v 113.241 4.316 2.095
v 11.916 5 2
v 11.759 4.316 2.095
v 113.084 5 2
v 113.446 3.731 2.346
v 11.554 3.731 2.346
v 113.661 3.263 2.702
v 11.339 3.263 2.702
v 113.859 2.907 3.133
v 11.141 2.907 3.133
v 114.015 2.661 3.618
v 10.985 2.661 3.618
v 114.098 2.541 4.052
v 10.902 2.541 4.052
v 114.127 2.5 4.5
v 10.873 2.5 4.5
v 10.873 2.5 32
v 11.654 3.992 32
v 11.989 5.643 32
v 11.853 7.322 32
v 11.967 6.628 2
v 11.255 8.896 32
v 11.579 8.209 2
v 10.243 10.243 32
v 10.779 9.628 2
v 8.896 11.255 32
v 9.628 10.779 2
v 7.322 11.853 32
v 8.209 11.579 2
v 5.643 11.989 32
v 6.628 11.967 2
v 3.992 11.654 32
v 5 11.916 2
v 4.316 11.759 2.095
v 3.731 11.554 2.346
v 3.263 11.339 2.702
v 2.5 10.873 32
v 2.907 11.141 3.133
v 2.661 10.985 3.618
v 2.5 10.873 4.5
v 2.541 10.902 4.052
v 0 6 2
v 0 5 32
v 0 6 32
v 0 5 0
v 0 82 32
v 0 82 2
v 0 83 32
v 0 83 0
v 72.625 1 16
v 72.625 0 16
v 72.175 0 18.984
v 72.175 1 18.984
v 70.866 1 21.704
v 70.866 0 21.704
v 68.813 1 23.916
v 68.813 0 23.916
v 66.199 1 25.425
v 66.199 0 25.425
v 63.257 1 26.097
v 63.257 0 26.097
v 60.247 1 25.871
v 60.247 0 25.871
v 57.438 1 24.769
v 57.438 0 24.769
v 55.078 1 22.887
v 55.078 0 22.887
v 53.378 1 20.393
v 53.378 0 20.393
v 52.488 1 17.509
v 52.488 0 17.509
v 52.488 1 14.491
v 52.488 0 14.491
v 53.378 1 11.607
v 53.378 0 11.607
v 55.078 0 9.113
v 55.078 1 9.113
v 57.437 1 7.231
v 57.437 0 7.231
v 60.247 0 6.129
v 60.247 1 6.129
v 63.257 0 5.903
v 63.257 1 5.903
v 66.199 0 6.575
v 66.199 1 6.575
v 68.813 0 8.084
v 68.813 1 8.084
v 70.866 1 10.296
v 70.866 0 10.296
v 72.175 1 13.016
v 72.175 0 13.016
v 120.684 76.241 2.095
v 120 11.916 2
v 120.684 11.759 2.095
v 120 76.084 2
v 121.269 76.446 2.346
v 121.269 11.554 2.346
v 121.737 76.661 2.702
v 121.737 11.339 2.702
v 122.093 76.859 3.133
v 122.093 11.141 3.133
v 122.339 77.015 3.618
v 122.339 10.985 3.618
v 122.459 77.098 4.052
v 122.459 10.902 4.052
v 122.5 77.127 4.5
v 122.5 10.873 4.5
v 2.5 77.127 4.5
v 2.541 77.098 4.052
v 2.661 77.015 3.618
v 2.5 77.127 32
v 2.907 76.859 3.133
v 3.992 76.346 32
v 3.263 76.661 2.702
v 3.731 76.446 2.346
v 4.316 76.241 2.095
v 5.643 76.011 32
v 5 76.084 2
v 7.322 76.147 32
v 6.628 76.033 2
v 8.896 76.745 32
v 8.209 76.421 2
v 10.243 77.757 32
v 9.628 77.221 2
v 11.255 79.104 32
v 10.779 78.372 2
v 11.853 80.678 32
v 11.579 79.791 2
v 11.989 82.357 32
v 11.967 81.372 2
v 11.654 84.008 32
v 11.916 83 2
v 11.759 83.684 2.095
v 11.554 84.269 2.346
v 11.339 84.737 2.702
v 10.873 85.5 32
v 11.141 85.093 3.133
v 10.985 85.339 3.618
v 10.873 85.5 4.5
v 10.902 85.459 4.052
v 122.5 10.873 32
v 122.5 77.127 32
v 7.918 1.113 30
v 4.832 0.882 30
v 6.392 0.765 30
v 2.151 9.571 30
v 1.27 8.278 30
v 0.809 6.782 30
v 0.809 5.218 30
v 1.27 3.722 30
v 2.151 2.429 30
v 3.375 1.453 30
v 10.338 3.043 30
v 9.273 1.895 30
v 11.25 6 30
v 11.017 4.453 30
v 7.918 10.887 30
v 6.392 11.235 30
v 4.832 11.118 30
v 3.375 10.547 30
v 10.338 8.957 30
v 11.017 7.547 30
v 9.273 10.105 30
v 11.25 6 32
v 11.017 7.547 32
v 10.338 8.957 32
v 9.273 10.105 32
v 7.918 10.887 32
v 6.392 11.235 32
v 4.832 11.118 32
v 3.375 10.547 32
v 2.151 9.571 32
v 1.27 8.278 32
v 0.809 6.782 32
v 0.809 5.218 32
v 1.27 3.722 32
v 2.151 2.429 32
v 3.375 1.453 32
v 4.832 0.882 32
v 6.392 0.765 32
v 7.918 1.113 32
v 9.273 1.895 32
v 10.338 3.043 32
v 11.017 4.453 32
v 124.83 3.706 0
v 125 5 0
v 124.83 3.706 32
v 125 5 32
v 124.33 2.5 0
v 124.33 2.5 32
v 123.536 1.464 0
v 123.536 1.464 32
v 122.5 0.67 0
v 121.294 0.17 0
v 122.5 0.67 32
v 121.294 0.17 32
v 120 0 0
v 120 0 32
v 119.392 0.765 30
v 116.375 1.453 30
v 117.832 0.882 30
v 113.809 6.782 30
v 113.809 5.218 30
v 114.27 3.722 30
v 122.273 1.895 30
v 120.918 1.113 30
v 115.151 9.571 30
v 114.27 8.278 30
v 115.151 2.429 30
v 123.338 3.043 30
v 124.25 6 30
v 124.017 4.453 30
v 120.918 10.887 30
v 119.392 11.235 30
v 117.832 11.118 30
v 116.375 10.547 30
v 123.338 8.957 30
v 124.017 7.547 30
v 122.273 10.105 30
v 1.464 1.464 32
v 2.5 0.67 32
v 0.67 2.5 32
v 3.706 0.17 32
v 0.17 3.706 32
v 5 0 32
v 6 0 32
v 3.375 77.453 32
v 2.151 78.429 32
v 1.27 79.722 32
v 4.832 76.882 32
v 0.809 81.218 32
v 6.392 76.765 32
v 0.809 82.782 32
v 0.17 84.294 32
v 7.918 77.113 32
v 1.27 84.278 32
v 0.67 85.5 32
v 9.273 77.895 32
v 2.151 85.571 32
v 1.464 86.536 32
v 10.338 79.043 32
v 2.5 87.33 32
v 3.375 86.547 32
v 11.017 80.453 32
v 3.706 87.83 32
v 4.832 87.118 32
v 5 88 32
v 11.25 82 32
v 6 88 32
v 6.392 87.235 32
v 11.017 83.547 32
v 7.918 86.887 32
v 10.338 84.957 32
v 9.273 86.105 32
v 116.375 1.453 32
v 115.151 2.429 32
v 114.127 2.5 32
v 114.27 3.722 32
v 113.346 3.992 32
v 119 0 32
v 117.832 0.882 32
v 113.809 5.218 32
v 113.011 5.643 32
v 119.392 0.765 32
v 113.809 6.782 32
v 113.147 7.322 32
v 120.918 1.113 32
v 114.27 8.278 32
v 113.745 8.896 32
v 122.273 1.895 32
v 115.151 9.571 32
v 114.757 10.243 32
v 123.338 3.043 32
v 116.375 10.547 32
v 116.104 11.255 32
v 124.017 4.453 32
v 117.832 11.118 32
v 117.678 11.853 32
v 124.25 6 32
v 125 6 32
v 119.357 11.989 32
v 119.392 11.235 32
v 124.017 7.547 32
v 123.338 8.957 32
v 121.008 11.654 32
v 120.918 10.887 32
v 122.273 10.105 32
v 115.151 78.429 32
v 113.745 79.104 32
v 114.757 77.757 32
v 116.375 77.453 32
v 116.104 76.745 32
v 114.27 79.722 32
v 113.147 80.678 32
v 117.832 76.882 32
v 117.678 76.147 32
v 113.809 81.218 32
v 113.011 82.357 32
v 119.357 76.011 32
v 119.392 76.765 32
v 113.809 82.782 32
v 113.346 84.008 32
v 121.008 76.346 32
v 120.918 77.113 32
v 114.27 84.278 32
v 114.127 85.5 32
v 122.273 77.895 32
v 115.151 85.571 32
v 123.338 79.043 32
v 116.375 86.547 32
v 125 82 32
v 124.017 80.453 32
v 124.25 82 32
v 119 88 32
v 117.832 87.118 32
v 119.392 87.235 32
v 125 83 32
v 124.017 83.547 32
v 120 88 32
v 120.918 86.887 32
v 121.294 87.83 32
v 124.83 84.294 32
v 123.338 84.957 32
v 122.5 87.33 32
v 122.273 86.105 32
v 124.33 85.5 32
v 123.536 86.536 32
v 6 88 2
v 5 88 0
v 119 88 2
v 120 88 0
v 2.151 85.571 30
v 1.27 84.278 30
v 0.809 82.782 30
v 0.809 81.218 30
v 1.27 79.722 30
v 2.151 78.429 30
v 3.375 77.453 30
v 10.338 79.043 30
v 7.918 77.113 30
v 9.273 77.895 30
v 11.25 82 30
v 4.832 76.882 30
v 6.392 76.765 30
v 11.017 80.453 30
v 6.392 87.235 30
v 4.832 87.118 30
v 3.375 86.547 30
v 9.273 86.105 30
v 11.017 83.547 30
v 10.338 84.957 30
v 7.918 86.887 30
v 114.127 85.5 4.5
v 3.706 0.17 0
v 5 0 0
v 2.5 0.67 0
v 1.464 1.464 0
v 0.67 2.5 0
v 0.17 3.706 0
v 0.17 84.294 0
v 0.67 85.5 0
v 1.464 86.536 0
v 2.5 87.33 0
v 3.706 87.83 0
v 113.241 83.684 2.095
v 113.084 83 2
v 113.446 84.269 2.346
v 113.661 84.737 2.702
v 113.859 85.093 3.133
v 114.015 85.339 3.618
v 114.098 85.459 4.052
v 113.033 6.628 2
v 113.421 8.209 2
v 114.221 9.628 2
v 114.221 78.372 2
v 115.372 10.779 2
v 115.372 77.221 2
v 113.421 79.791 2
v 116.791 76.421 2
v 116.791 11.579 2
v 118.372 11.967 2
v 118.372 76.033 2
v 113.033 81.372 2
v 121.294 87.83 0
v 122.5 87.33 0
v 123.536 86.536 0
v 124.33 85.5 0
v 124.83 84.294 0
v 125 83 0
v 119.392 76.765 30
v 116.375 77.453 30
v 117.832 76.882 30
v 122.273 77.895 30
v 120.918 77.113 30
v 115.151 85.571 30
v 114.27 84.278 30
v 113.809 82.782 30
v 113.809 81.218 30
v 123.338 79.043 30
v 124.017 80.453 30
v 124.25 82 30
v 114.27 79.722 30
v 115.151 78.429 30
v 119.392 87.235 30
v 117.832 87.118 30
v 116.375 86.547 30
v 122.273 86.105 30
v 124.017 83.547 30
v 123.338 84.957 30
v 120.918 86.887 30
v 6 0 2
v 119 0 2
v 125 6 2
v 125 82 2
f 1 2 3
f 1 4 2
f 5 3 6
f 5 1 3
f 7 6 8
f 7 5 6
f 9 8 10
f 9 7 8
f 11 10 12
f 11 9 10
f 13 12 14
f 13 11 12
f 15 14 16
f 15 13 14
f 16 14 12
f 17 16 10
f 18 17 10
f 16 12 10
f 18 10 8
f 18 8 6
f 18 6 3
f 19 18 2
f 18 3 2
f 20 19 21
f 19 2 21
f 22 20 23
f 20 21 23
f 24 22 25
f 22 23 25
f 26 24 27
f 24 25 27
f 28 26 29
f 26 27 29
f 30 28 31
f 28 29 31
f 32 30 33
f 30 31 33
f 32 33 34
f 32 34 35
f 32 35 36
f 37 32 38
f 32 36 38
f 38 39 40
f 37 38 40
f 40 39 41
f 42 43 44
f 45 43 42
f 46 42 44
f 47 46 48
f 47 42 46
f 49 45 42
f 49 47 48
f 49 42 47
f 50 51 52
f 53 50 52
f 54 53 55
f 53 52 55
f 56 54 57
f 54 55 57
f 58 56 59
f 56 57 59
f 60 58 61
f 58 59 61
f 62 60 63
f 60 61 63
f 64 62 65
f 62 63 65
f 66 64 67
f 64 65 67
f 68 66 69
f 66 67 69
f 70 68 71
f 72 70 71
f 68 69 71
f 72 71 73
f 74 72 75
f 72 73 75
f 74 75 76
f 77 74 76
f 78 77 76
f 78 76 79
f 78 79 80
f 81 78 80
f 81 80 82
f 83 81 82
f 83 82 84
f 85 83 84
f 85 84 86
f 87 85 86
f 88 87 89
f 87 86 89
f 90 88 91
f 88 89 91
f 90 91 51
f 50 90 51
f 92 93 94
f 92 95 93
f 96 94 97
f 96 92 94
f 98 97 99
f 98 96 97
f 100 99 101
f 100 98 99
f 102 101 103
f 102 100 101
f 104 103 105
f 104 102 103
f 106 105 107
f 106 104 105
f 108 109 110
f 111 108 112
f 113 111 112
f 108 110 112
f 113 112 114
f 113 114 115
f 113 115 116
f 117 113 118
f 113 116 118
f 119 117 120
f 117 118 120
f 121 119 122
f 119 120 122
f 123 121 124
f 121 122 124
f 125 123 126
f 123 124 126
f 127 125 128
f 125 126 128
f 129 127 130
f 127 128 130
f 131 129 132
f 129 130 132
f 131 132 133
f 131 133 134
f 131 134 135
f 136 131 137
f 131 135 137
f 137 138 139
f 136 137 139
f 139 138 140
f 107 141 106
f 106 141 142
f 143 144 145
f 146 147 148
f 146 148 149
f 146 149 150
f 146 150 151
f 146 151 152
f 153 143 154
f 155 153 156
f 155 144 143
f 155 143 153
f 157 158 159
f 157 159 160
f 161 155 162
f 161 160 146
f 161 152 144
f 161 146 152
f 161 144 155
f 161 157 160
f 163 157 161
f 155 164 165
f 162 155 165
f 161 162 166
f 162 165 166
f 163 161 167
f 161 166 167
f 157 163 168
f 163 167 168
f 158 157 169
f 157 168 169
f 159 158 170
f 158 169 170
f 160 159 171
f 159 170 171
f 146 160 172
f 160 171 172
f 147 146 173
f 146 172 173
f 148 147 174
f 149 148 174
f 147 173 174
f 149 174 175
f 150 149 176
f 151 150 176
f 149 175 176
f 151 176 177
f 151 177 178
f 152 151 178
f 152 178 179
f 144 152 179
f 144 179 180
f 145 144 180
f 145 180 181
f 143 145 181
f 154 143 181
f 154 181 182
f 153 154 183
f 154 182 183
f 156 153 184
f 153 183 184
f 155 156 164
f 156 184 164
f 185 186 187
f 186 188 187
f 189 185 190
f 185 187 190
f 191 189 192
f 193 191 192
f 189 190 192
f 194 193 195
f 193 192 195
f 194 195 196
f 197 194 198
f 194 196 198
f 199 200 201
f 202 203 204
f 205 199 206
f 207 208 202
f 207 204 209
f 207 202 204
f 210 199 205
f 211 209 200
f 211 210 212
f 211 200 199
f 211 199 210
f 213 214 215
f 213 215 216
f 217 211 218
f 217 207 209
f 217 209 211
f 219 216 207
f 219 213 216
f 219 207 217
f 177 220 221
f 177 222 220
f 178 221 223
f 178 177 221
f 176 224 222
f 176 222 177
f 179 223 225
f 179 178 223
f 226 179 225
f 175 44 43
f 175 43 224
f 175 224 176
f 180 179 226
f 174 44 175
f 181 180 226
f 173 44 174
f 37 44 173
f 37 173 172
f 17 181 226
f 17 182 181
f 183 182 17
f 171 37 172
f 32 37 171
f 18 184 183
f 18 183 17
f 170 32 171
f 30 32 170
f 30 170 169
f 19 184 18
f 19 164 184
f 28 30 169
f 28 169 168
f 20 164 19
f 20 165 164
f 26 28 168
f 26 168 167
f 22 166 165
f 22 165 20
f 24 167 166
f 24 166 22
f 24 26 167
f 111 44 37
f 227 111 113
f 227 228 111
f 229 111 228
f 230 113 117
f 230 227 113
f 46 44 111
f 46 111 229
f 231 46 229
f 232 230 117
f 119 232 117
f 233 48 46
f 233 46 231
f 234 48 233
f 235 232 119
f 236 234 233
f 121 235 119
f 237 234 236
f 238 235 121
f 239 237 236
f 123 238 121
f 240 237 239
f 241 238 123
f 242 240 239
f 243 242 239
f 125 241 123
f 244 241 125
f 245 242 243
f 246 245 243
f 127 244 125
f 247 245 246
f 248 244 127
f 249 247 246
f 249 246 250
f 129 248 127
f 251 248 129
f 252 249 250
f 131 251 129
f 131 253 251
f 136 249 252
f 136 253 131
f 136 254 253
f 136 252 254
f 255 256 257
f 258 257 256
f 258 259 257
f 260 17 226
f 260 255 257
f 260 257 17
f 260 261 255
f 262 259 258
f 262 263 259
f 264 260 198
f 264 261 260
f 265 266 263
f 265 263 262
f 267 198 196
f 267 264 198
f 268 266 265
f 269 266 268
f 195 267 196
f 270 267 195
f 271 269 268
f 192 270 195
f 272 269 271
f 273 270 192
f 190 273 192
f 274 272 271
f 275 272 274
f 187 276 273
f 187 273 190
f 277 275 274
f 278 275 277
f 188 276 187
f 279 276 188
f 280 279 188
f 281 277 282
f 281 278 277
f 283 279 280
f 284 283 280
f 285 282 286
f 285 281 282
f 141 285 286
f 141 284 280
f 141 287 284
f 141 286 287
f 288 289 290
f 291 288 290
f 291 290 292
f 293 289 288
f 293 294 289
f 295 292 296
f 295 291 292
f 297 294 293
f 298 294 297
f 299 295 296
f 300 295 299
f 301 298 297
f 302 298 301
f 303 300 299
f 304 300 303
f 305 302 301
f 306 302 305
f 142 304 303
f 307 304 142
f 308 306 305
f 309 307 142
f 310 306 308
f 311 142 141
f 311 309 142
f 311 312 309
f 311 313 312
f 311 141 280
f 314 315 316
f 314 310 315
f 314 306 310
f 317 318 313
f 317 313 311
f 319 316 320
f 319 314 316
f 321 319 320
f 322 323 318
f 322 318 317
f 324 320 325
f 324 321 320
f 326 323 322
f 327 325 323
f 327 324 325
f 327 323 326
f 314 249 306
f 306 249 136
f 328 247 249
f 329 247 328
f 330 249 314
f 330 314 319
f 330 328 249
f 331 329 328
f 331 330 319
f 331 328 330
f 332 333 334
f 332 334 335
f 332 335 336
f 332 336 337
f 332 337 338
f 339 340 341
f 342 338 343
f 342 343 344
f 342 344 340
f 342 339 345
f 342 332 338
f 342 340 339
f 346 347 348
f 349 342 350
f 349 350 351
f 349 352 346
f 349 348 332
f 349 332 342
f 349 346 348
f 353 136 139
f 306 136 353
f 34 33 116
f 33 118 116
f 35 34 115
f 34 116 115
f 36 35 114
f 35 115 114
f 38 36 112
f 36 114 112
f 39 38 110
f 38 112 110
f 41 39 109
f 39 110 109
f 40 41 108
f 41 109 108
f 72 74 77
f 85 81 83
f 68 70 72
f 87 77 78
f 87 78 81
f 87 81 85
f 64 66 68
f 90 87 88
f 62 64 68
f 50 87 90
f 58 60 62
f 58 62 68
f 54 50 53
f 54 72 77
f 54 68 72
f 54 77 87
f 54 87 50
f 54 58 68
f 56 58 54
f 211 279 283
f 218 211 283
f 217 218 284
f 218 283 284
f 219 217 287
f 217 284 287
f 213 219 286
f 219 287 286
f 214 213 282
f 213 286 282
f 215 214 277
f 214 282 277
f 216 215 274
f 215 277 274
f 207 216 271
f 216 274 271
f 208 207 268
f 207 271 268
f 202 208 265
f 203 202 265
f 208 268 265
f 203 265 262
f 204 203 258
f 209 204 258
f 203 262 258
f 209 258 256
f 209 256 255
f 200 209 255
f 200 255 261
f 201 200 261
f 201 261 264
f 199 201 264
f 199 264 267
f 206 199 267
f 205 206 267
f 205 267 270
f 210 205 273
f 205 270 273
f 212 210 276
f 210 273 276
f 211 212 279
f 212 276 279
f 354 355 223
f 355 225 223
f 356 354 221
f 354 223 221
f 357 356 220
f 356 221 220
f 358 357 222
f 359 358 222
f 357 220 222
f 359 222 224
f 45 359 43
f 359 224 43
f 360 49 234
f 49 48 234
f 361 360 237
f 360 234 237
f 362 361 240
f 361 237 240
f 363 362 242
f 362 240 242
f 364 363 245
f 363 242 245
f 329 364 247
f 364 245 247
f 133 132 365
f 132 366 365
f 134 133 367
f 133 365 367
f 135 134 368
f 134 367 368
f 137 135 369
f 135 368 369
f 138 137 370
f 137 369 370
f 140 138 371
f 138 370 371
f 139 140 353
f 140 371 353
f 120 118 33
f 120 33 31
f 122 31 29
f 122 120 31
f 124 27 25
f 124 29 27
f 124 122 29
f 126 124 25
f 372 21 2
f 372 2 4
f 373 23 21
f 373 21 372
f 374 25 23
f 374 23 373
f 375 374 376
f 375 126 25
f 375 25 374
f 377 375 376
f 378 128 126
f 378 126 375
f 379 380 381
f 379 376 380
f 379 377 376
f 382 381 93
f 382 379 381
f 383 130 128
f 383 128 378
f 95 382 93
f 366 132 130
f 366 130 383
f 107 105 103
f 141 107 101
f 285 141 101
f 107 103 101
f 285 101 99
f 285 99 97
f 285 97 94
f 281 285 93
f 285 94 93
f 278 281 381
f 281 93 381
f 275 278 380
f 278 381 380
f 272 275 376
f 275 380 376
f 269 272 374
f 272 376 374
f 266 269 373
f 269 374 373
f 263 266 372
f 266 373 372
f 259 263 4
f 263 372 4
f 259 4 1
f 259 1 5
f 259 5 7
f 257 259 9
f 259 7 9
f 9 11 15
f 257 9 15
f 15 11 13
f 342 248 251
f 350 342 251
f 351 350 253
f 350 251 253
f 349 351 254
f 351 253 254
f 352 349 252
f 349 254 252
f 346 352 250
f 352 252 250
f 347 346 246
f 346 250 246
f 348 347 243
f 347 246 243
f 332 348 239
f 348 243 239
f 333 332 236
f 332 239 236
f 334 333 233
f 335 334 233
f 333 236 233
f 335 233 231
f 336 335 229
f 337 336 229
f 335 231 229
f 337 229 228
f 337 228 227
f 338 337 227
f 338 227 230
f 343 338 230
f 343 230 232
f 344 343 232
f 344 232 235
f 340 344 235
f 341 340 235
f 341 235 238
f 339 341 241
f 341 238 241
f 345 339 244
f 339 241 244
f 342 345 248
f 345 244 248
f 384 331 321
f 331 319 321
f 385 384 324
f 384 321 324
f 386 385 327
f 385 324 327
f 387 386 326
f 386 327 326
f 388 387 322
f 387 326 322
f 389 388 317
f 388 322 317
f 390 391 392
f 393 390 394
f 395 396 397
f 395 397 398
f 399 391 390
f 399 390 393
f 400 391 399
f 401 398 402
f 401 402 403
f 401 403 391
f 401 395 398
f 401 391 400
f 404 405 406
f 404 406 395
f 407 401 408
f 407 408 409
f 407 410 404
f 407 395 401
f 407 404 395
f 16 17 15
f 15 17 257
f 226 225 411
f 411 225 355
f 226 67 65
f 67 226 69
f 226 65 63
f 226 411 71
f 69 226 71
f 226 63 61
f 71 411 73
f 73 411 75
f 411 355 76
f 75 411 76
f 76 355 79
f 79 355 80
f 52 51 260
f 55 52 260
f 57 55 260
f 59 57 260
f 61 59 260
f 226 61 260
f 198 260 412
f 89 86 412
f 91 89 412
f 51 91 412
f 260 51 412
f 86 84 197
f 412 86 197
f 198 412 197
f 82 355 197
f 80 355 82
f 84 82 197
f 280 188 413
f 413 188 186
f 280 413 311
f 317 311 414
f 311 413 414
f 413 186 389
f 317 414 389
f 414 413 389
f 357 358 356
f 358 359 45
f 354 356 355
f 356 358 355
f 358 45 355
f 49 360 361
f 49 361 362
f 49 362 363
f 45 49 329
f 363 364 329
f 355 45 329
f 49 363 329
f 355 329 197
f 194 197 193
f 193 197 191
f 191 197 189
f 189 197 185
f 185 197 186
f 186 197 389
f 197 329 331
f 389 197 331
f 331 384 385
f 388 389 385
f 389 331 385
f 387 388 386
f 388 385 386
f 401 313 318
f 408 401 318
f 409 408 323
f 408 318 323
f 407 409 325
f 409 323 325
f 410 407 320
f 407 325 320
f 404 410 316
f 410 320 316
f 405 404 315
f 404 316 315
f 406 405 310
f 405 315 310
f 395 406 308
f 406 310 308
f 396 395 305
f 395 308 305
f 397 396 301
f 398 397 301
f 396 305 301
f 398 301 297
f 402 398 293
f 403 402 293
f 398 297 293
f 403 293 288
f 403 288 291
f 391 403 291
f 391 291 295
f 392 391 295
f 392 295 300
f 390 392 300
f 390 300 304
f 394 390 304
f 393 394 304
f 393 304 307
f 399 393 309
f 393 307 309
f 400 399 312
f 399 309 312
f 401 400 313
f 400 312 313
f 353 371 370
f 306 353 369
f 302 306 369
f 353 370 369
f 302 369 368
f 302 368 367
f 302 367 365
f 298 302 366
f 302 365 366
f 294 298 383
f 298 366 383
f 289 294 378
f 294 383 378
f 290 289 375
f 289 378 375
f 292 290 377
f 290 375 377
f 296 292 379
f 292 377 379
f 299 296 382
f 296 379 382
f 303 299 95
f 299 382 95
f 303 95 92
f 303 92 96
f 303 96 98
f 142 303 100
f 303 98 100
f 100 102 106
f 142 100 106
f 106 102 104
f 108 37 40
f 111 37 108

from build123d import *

# Parameters (mm, degrees)
SKETCH_W        = 125
SKETCH_H        = 88
PAD_DEPTH       = 32
SKETCH001_W     = 120
SKETCH001_H     = 83
POCKET_DEPTH    = 32
SKETCH002_R     = 6
PAD001_DEPTH    = 30
SKETCH003_R     = 5.25
POCKET001_DEPTH = 2
FILLET_R        = 2.5
FILLET001_R     = 2.5
FILLET002_R     = 2.5
FILLET003_R     = 2.5
FILLET004_R     = 5
FILLET005_R     = 5
FILLET006_R     = 5
FILLET007_R     = 5
SKETCH004_R     = 10.125
POCKET002_DEPTH = 1


with BuildPart() as part:
    # Sketch → Pad (new body)
    with BuildSketch(Plane.XY):
        with Locations((62.5, 44)):
            Rectangle(SKETCH_W, SKETCH_H)
    extrude(amount=PAD_DEPTH)

    # Sketch001 → Pocket (cut)
    with BuildSketch(Plane.XY.offset(34)):
        with Locations((62.5, 44)):
            Rectangle(SKETCH001_W, SKETCH001_H)
    extrude(amount=-POCKET_DEPTH, mode=Mode.SUBTRACT)

    # Sketch002 (on Face11 of Pocket) → Pad001 (join)
    with BuildSketch(Plane.XY.offset(2)):
        with Locations((6, 6)):
            Circle(SKETCH002_R)
        with Locations((6, 82)):
            Circle(SKETCH002_R)
        with Locations((119, 82)):
            Circle(SKETCH002_R)
        with Locations((119, 6)):
            Circle(SKETCH002_R)
    extrude(amount=PAD001_DEPTH)

    # Sketch003 (on Face27 of Pad001) → Pocket001 (cut)
    with BuildSketch(Plane.XY.offset(32)):
        with Locations((6, 6)):
            Circle(SKETCH003_R)
        with Locations((6, 82)):
            Circle(SKETCH003_R)
        with Locations((119, 82)):
            Circle(SKETCH003_R)
        with Locations((119, 6)):
            Circle(SKETCH003_R)
    extrude(amount=-POCKET001_DEPTH, mode=Mode.SUBTRACT)

    # Fillet
    fillet_edges = [part.edges().sort_by_distance(p)[0] for p in [
        (62.5, 2.5, 2),
    ]]
    fillet(fillet_edges, radius=FILLET_R)

    # Fillet001
    fillet001_edges = [part.edges().sort_by_distance(p)[0] for p in [
        (122.5, 44, 2),
    ]]
    fillet(fillet001_edges, radius=FILLET001_R)

    # Fillet002
    fillet002_edges = [part.edges().sort_by_distance(p)[0] for p in [
        (62.5, 85.5, 2),
    ]]
    fillet(fillet002_edges, radius=FILLET002_R)

    # Fillet003
    fillet003_edges = [part.edges().sort_by_distance(p)[0] for p in [
        (2.5, 44, 2),
    ]]
    fillet(fillet003_edges, radius=FILLET003_R)

    # Fillet004
    fillet004_edges = [part.edges().sort_by_distance(p)[0] for p in [
        (125, 88, 16),
    ]]
    fillet(fillet004_edges, radius=FILLET004_R)

    # Fillet005
    fillet005_edges = [part.edges().sort_by_distance(p)[0] for p in [
        (125, 0, 16),
    ]]
    fillet(fillet005_edges, radius=FILLET005_R)

    # Fillet006
    fillet006_edges = [part.edges().sort_by_distance(p)[0] for p in [
        (0, 0, 16),
    ]]
    fillet(fillet006_edges, radius=FILLET006_R)

    # Fillet007
    fillet007_edges = [part.edges().sort_by_distance(p)[0] for p in [
        (0, 88, 16),
    ]]
    fillet(fillet007_edges, radius=FILLET007_R)

    # Sketch004 (on Face6 of Fillet007) → Pocket002 (cut)
    with BuildSketch(Plane.XZ):
        with Locations((62.5, 16)):
            Circle(SKETCH004_R)
    extrude(amount=-POCKET002_DEPTH, mode=Mode.SUBTRACT)


solid = part.part
